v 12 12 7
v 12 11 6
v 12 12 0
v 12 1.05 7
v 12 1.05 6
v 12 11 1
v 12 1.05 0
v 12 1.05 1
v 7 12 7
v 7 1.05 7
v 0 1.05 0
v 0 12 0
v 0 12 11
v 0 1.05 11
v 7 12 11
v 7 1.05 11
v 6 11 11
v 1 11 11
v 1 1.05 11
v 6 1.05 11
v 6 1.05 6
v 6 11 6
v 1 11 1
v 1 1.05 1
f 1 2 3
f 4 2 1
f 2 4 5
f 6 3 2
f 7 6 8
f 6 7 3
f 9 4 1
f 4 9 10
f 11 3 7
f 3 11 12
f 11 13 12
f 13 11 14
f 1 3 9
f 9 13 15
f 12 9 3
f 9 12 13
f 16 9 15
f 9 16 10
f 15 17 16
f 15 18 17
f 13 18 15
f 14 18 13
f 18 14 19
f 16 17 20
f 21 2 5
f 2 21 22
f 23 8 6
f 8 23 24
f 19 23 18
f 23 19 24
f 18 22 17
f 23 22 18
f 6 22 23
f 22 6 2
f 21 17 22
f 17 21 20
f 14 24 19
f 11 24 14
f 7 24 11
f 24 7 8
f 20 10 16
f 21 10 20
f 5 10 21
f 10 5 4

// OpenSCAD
// housing to hold and stabilize two 2.0mm JST-PH connectors that are soldered
// together in a 90 degree angle for an LED strip connection


// Parameters
pipe_width = 10; // Width of the pipe
pipe_height = 5; // Height of the pipe
wall_thickness = 1; // Thickness of the pipe wall
arm_right_length = 12;
arm_up_length = 11
;

// Calculate total width and height including walls
total_width = pipe_width + 2 * wall_thickness;
total_height = pipe_height + 2 * wall_thickness;

// Pipe with rectangular cross-section
difference() {
    union() {
        cube([arm_right_length, total_width, total_height]);
        cube([total_height, total_width, arm_up_length]);
    }

    translate([wall_thickness, wall_thickness, wall_thickness]) {
        cube([arm_right_length+1, pipe_width, pipe_height]);
        cube([pipe_height, pipe_width, arm_up_length+1]);
    }
    
    translate([-.05, -.05, -.05]) {
        cube([arm_right_length+.1, wall_thickness+.1, arm_up_length+.1]);
    }
}
